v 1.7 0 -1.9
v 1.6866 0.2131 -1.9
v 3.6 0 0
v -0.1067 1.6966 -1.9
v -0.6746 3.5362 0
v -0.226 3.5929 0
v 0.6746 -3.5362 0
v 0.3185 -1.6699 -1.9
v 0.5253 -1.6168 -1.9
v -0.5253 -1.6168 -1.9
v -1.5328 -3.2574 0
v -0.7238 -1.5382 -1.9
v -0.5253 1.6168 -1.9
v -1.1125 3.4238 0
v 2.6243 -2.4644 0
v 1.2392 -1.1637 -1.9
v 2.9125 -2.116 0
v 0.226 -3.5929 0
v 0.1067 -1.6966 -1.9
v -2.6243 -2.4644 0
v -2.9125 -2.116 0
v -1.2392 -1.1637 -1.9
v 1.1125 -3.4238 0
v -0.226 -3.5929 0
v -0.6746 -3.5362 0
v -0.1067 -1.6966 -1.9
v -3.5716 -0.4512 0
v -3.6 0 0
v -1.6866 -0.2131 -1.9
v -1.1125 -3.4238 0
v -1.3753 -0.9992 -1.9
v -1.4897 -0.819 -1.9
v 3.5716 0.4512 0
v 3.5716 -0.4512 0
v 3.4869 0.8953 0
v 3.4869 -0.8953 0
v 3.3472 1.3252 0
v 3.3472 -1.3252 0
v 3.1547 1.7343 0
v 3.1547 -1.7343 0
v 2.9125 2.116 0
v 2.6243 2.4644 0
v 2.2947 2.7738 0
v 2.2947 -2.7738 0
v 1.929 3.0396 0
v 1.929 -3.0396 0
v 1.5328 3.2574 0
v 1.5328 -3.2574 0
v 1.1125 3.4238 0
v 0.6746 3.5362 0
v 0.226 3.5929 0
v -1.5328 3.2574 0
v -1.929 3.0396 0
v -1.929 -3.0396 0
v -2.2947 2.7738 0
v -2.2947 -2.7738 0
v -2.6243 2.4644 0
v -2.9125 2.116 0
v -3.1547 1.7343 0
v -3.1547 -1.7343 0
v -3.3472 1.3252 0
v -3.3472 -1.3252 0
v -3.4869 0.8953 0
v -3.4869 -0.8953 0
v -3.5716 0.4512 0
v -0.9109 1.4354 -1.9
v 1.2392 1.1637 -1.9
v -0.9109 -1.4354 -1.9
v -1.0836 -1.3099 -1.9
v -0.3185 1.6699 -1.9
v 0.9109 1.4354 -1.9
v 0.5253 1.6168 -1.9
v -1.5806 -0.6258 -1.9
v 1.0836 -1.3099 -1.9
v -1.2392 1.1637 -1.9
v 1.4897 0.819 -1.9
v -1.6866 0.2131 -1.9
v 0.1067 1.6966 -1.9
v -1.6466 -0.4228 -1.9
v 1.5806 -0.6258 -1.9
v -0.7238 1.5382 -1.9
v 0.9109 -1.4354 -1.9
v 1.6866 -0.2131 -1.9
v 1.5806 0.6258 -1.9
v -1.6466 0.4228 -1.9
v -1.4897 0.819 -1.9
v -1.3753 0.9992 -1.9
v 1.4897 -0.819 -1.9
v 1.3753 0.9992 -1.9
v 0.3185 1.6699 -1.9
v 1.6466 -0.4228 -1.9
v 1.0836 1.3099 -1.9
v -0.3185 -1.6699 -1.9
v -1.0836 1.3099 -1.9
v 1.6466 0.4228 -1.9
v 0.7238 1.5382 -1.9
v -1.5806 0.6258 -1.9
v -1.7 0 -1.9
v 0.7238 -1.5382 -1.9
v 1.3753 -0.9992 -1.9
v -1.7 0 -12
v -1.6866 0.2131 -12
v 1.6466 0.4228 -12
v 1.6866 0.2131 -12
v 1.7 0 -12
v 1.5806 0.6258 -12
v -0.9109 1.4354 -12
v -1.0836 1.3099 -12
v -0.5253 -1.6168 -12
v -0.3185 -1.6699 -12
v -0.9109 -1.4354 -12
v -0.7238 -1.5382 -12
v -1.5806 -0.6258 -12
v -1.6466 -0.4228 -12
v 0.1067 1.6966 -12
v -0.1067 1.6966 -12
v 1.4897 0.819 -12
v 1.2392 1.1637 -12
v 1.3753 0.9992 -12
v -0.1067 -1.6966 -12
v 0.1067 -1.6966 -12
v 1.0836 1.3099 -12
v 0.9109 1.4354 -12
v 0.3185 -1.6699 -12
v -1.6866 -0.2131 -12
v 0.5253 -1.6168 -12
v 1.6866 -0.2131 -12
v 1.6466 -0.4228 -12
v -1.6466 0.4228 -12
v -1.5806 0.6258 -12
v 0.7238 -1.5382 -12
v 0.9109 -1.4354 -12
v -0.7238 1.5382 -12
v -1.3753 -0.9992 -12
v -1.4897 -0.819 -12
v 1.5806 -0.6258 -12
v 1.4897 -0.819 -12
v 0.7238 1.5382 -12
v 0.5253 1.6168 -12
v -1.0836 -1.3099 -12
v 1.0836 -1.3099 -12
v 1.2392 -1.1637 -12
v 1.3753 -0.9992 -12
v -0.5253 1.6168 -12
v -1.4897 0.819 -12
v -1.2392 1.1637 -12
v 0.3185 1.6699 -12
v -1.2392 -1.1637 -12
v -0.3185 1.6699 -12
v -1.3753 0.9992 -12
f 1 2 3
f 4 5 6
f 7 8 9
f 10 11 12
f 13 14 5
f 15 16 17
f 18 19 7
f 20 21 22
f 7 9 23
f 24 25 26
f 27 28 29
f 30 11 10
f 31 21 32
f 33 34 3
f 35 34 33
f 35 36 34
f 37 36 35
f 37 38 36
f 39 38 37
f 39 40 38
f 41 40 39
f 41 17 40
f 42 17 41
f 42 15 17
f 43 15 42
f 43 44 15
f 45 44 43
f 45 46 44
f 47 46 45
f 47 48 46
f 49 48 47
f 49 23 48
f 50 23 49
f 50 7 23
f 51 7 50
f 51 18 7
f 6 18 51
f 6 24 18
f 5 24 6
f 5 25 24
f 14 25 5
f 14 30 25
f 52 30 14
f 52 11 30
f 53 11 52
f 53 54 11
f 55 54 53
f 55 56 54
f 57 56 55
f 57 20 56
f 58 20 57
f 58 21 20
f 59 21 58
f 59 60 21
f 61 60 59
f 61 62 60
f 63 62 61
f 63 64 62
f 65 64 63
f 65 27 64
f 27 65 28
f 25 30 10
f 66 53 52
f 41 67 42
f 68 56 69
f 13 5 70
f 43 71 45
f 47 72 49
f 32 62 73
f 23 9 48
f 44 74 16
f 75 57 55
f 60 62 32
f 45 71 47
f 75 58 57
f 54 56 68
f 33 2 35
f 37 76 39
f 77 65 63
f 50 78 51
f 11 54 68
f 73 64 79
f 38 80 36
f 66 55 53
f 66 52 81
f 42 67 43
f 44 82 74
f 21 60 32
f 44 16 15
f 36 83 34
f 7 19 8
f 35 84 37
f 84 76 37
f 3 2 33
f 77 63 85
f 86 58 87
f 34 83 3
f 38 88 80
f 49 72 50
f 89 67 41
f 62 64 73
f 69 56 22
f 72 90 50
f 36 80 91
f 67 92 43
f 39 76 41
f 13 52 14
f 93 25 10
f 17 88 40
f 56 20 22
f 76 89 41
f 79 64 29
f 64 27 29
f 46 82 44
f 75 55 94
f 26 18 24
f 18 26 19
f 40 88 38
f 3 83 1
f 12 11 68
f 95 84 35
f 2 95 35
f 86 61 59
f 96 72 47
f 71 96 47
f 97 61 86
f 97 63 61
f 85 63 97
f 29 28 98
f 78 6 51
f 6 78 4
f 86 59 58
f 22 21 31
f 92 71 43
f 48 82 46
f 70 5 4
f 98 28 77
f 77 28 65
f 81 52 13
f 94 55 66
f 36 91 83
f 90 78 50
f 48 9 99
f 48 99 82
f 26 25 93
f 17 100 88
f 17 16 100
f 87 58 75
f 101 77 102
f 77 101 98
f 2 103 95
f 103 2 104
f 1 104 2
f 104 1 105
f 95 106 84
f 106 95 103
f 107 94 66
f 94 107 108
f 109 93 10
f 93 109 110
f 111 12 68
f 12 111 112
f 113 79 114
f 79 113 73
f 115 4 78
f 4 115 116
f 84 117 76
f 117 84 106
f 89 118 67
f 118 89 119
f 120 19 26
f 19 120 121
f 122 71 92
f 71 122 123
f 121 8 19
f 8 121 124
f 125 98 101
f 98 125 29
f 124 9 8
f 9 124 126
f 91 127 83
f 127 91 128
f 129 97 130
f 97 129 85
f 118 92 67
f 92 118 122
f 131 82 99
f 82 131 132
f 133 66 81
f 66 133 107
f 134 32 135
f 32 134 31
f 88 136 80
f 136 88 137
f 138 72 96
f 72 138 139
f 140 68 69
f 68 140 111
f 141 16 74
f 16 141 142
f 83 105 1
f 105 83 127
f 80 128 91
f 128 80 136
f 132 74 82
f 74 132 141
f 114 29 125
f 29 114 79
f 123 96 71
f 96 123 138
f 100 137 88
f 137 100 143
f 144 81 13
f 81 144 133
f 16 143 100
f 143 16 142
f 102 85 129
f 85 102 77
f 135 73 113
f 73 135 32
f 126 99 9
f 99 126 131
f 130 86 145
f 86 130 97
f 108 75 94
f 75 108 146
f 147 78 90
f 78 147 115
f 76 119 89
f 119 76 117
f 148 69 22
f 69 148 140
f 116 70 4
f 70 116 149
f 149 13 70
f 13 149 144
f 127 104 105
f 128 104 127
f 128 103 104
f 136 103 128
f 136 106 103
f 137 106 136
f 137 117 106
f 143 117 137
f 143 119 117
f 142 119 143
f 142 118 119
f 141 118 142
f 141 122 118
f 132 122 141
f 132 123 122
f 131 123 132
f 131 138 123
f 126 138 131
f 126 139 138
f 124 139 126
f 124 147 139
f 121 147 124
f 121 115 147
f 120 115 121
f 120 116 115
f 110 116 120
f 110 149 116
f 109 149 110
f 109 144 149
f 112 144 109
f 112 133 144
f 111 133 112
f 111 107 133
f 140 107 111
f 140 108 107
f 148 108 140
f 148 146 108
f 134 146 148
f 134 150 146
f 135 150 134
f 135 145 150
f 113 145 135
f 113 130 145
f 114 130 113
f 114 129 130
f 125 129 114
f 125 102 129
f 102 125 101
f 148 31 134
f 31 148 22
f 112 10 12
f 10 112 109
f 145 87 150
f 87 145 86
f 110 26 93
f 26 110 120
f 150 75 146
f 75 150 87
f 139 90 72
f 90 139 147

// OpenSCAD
// Generated by SolidPython 1.1.3 on 2023-03-13 21:43:02
$fn = 50;


difference() {
	union() {
		translate(v = [0, 0, -1.9000000000]) {
			rotate(a = [0, 0, 0]) {
				cylinder(h = 1.9000000000, r1 = 1.7000000000, r2 = 3.6000000000);
			}
		}
		translate(v = [0, 0, -12]) {
			rotate(a = [0, 0, 0]) {
				cylinder(h = 12, r = 1.7000000000);
			}
		}
	}
	union();
}
/***********************************************
*********      SolidPython code:      **********
************************************************
 
from solid import *
import os
import subprocess

import oomB

import opsc_library_gen

mode = "laser"
#mode = "3d_print"

defined_objects = {}

radius_dict = {}
countersunk_dict = {}


def set_mode(m):
    global mode
    mode = m
    radius_dict['M6'] = 6.5/2
    radius_dict['M3'] = 3.3/2
    if mode == "laser":
        radius_dict['M6'] = 6/2
        radius_dict['M3'] = 3/2

    countersunk_dict['M3'] = {}
    countersunk_dict['M3']['little_rad'] = radius_dict['M3']
    countersunk_dict['M3']['big_rad'] = (5.5+0.6)/2
    if mode == "laser":
        countersunk_dict['M3']['big_rad'] = (4.75+0.6)/2
        countersunk_dict['M3']['little_rad'] = (4.75+0.6)/2

    countersunk_dict['M3']['height'] = 1.7


def opsc_make_object(filename, objects, save_type="none",resolution=50, layers = 1, tilediff = 200, mode="laser", overwrite=True):
    if overwrite or not os.path.exists(filename):
        set_mode(mode)
        save_type = save_type.lower()
        os.makedirs(os.path.dirname(filename), exist_ok=True)
        final_object = opsc_get_object(objects, mode = mode)
        # Save the final object to the specified filename    
        scad_render_to_file(final_object, filename, file_header='$fn = %s;' % resolution, include_orig_code=True)
        if save_type == "all":
            saveToAll(filename)
        elif save_type == "dxf":
            saveToDxf(filename)
        if mode == "laser":
            filename_laser = filename.replace(".scad","-flat.scad")
            scad_render_to_file(getLaser(final_object, layers=layers, tilediff=tilediff), filename_laser, file_header='$fn = %s;' % resolution, include_orig_code=True)
            if save_type == "all":
                saveToAll(filename_laser)
            elif save_type == "dxf":
                saveToDxf(filename_laser)


def opsc_get_object(objects, mode = "laser"):
    # Create the solidpython objects only include the positive objects and if they don't have inclusion or their inclusion is either all or mode
    # Initialize an empty list to store the results
    positive_objects = []

    # Iterate over the "objects" list
    for obj in objects:
        # Check if the current object has a "type" key with a value of "positive"
        if obj['type'] == 'positive':
            # Check if the current object has an "inclusion" key and its value matches "mode",
            # or if the current object does not have an "inclusion" key at all
            if not 'inclusion' in obj or obj['inclusion'] == "all" or obj['inclusion'] == mode:
                # Call the "get_opsc_item" function with the current object as an argument
                opsc_item = get_opsc_item(obj)
                # Add the result to the "positive_objects" list
                positive_objects.append(opsc_item)
# Initialize an empty list to store the results
    negative_objects = []

    # Iterate over the "objects" list
    for obj in objects:
        # Check if the current object has a "type" key with a value of "negative"
        if obj['type'] == 'negative':
            # Check if the current object has an "inclusion" key and its value matches "mode",
            # or if the current object does not have an "inclusion" key at all
            if not 'inclusion' in obj or obj['inclusion'] == "all" or obj['inclusion'] == mode:
                # Call the "get_opsc_item" function with the current object as an argument
                opsc_item = get_opsc_item(obj)
                # Add the result to the "negative_objects" list
                negative_objects.append(opsc_item)
    
    #positive_objects = [get_opsc_item(obj) for obj in objects if obj['type'] == 'positive']
    #negative_objects = [get_opsc_item(obj) for obj in objects if obj['type'] == 'negative']
    # Union the positive objects
    positive_object = union()(*positive_objects)
    # Union the negative objects
    negative_object = union()(*negative_objects)
    # Create the final object by subtracting the negative objects from the positive objects
    return difference()(positive_object, negative_object)

def get_opsc_item(params):
    # A dictionary to map radius string values to numerical values
    #radius_dict = {'small': 5, 'medium': 10, 'large': 15}
    # An array of function names for basic shapes
    basic_shapes = ['cube', 'sphere', 'cylinder']
    
    # An array of function names for other shapes
    other_shapes = ['hole', 'slot', 'rounded_rectangle', 'countersunk', 'polyg']
    


    # Convert radius to r if present, and remove radius from the params dictionary
    if 'radius' in params:
        if isinstance(params['radius'], str):
            # Use the radius_dict to map the radius string value to a numerical value
            params['r'] = radius_dict[params['radius']]
        else:
            params['r'] = params['radius']
        del params['radius']
    

    # Check if the object type is a basic shape
    if params['shape'] in basic_shapes:
        # Remove shape and unexpected dictionary values
        allowed_keys = {'size', 'r', 'r1', 'r2', 'd', 'h', 'rw', 'rh', 'dw', 'dh'}
        shape_params = {k: v for k, v in params.items() if k in allowed_keys}

        #params['m'] = "#"
        ###split for adding modifier
        try:
            m = params['m']
            func = globals()[params['shape']]
            return_value = get_opsc_transform(params,func(**shape_params))
            return_value = (return_value).set_modifier(m)
            return return_value
        except KeyError as e:
            return get_opsc_transform(params,globals()[params['shape']](**shape_params))
        
    elif params['shape'] == 'polygon':
        # Remove shape and unexpected dictionary values
        h  = params['height']
        allowed_keys = {'points'}
        shape_params = {k: v for k, v in params.items() if k in allowed_keys}

        # Call the corresponding function for the shape parameter, using ** notation to pass the shape_params dictionary as keyword arguments
        params["rot"] = [0,0,0]        
        try:
            m = params['m']
            func = globals()[params['shape']]
            return_value = get_opsc_transform(params,linear_extrude(h)(globals()[params['shape']](**shape_params)))
            return_value = (return_value).set_modifier(m)
            return return_value
        except KeyError as e:
            return_value = get_opsc_transform(params,linear_extrude(h)(globals()[params['shape']](**shape_params)))
            return_value = (return_value)
            return return_value


    # If the object type is not a basic shape, check if it's a defined object or one of the other shapes
    elif params['shape'] in other_shapes:
        # Call the corresponding function for the shape parameter, passing the params dictionary as an argument
        p2 = copy.deepcopy(params)
        p2["pos"] = [0,0,0]
        return get_opsc_transform(params,globals()[params['shape']](p2))
    
    # If the object is not a basic shape or a defined object, try to import it from a .scad file
    else:
        obj = defined_objects[params['shape']]
        return get_opsc_transform(params,obj)

def get_opsc_transform(params, solid_obj):
    # Rotate the object based on the 'rot' field in the params dictionary, or the 'rotX', 'rotY', and 'rotZ' fields if 'rot' is not present
    rot = params.get('rot', [])
    if rot:
        rotX, rotY, rotZ = rot
    else:
        rotX = params.get('rotX', 0)
        rotY = params.get('rotY', 0)
        rotZ = params.get('rotZ', 0)
    solid_obj = rotate([rotX, rotY, rotZ])(solid_obj)

    # Translate the object based on the 'pos' field in the params dictionary, or the 'x', 'y', and 'z' fields if 'pos' is not present
    pos = params.get('pos', [])
    if pos:
        x, y, z = pos
    else:
        x = params.get('x', 0)
        y = params.get('y', 0)
        z = params.get('z', 0)
    solid_obj = translate([x, y, z])(solid_obj)
    return solid_obj


import random

def opsc_easy_array(type, shape, repeats, pos_start, shift_arr, **kwargs):
    for i in range(0,3):
        repeats.append(1)
        pos_start.append(0)
        shift_arr.append(0)
    return_objects = []

    for x in range(0,repeats[0]):
        for y in range(0,repeats[1]):
            for z in range(0,repeats[2]):
                return_objects.append(opsc_easy(type, shape, pos=[pos_start[0]+x*shift_arr[0],pos_start[1]+y*shift_arr[1],pos_start[2]+z*shift_arr[2]], **kwargs))
    return return_objects                



def opsc_easy(type, shape, **kwargs):
    obj = {
        'type': type,
        'shape': shape
    }
    for param in ['size', 'r', 'r1', 'r2', 'd', 'h', 'rw', 'rh', 'dw', 'dh', 'pos', 'x', 'y', 'z', 'rot', 'rotX', 'rotY', 'rotZ', "w", "inclusion", 'sides', 'height', "m"]:
        if param in kwargs:
            obj[param] = kwargs[param]
    return obj

def hole(params):
    p2 = copy.deepcopy(params)  
    # Check if the radius is a string and replace it with the corresponding value from the dictionary
    if isinstance(p2['r'], str):
        p2['r'] = radius_dict[p2['r']]
    
    # Set the height to 100 if not specified
    if 'h' not in p2:
        p2['h'] = 100
        p2["pos"] = [0,0,-50]
    p2["center"] = True
    # Create the cylinder object
    p2["shape"] = "cylinder"
    p2["type"] = "positive"

    return get_opsc_item(p2)

import copy

def countersunk(params):
    p2 = copy.deepcopy(params)
    counter_rad = p2['r']
    p2['r'] = radius_dict[p2['r']]
    hp = copy.deepcopy(p2)
    hp["type"] = "positive"
    hp["shape"] = "hole"
    del hp["rot"]
    hol = get_opsc_item(hp)
    
    cp = copy.deepcopy(p2)
    cp["h"] = countersunk_dict[counter_rad]["height"]
    cp["r2"] = countersunk_dict[counter_rad]["little_rad"]
    cp["r1"] = countersunk_dict[counter_rad]["big_rad"]
    del cp["r"]
    del cp["rot"]
    cp["type"] = "positive"
    cp["shape"] = "cylinder"
    cp["pos"] = [0,0,0]

    top = get_opsc_item(cp)
    return union()(hol,top)



def slot(params):  
    p2 = copy.deepcopy(params) 
    if isinstance(p2['r'], str):
        p2['r'] = radius_dict[p2['r']]
    p2["type"] = "positive"
    p2["shape"] = "hole"
    del p2["rot"]
    p2["pos"] = [0,0,0]
    left = copy.deepcopy(p2)
    right = copy.deepcopy(p2)
    left["pos"][0] = p2["w"] / 2 - p2["r"] 
    
    right["pos"][0] = -p2["w"] / 2 + p2["r"] 
    pass
    leftObj = get_opsc_item(left)
    rightObj = get_opsc_item(right)
    return hull()(leftObj, rightObj)

def rounded_rectangle(params):   
    p2 = copy.deepcopy(params) 
    p2["h"] = p2["size"][2]
    p2["pos"] = p2.get("pos", [0, 0, 0]) 
    p2["type"] = "positive"
    p2["shape"] = "hole"
    p2["pos"] = [0,0,0]
    
    if 'rot' in p2:
        del p2["rot"]   
    if 'r' not in p2:
        p2["r"] = 5 
    tl = copy.deepcopy(p2)
    tr = copy.deepcopy(p2)
    bl = copy.deepcopy(p2)
    br = copy.deepcopy(p2)
    tl["pos"][0] = -(p2["size"][0] - p2["r"]*2)/2
    tl["pos"][1] = (p2["size"][1] - p2["r"]*2)/2
    tr["pos"][0] = (p2["size"][0] - p2["r"]*2)/2
    tr["pos"][1] = (p2["size"][1] - p2["r"]*2)/2
    bl["pos"][0] = -(p2["size"][0] - p2["r"]*2)/2
    bl["pos"][1] = -(p2["size"][1] - p2["r"]*2)/2
    br["pos"][0] = (p2["size"][0] - p2["r"]*2)/2
    br["pos"][1] = -(p2["size"][1] - p2["r"]*2)/2
    del tl["size"]
    del tr["size"]
    del bl["size"]
    del br["size"]
    tlo = get_opsc_item(tl)
    tro = get_opsc_item(tr)
    blo = get_opsc_item(bl)
    bro = get_opsc_item(br)    
    return hull()(tlo, tro, blo, bro)



def polyg(params):
    p2 = copy.deepcopy(params) 
    p2["type"] = "positive"
    p2["shape"] = "polygon"
    p2["pos"] = [0,0,0]
    sides = p2["sides"]
    radius = p2["r"]    
    angles = [i * 360 / sides for i in range(sides)]
    points = regular_polygon(sides, radius)
    
    p2["points"] = points
    return get_opsc_item(p2)

import math

def regular_polygon(num_sides, radius):
    # Calculate the angle between each side
    angle = 2 * math.pi / num_sides

    # Calculate the points of the polygon
    points = []
    for i in range(num_sides):
        x = radius * math.cos(i * angle)
        y = radius * math.sin(i * angle)
        points.append((x, y))
    return points

def import_scad_object(filename):
    # Import the .scad file and convert it to a solidpython object
    #filename = "parts"
    obj = import_scad(filename)
    return obj.main()



import os
import solid as solidpython

# A dictionary to store the defined objects


def load_scad_objects():
    opsc_library_gen.gen_library(defined_objects)

import random

def test(num_objects):
    objects = []
    for i in range(num_objects):
        # Choose a random shape
        #shape = random.choice(['cube', 'sphere', 'cylinder', 'hole', 'slot', "rounded_rectangle"])
        shape = random.choice(["rounded_rectangle"])

        # Choose a random type
        type = random.choice(['positive', 'negative'])
        
        # Create an empty object dictionary
        obj = {'shape': shape, 'type': type}
        
        # Set shape-specific parameters
        if obj['shape'] in ['cube']:
            obj['size'] =  [random.uniform(5, 15), random.uniform(5, 15), random.uniform(5, 15)]
        if obj['shape'] in ['rounded_rectangle']:
            obj['size'] =  [random.uniform(5, 15), random.uniform(5, 15), random.uniform(5, 15)]
            obj['r'] = random.uniform(0.5, 5)
        elif obj['shape'] == 'sphere':
            obj['r'] = random.uniform(5, 15)
        elif obj['shape'] in ['cylinder', 'hole']:
            obj['r'] = random.uniform(0.5, 5)
            obj['h'] = random.uniform(5, 15)
        elif obj['shape'] == 'slot':
            obj['r'] = random.uniform(0.5, 5)
            obj['h'] = random.uniform(5, 15)
            obj['w'] = random.uniform(5, 15)
        
        # Set a random position and rotation
        obj['pos'] = [random.uniform(-20, 20), random.uniform(-20, 20), random.uniform(-20, 20)]
        obj['rot'] = [random.uniform(-180, 180), random.uniform(-180, 180), random.uniform(-180, 180)]
        
        # Add the object to the list
        objects.append(obj)
    return objects

####### old file saving
def saveToAll(fileIn):
    saveToStl(fileIn)
    saveToDxf(fileIn)
    saveToPng(fileIn)
    saveToSvg(fileIn)

def saveToDxf(fileIn, fileOut="", copy_to_laser=True):
    if fileOut == "":
        fileOut = fileIn.replace(".scad",".dxf")
    saveToFile(fileIn, fileOut)


    
def saveToPng(fileIn, fileOut="",extra="--render"):
    if fileOut == "":
        fileOut = fileIn.replace(".scad",".png")
    saveToFile(fileIn, fileOut)

def saveToStl(fileIn, fileOut=""):
    if fileOut == "":
        fileOut = fileIn.replace(".scad",".stl")
    saveToFile(fileIn, fileOut)
    
def saveToSvg(fileIn, fileOut=""):
    if fileOut == "":
        fileOut = fileIn.replace(".scad",".svg")
    saveToFile(fileIn, fileOut)

def saveToFile(fileIn, fileOut,extra=""):
    #extra = extra + " --colorscheme Tomorrow"

    launchStr = 'openscad -o "' + fileOut + '"' + extra + ' "' + fileIn + '"'
    if ".png" in fileOut:
        launchStr = launchStr + " --render"
    print("            saveToFile launch string: " + launchStr)
    subprocess.run(launchStr)
    x=0

def getLaser(final_object,start=1.5,layers=1,thickness=3,tilediff=200):
        rv= []

        for x in range(layers):
            rv.append(translate([0,x*tilediff,0])(
                    projection()(
                        intersection()(translate([-500,-500,start+x*thickness])(cube(size=[1000,1000,0.1])),
                            final_object
                        )
                    )
            )
            )
            
        return union()(rv)

set_mode("laser")
load_scad_objects() 
 
************************************************/
